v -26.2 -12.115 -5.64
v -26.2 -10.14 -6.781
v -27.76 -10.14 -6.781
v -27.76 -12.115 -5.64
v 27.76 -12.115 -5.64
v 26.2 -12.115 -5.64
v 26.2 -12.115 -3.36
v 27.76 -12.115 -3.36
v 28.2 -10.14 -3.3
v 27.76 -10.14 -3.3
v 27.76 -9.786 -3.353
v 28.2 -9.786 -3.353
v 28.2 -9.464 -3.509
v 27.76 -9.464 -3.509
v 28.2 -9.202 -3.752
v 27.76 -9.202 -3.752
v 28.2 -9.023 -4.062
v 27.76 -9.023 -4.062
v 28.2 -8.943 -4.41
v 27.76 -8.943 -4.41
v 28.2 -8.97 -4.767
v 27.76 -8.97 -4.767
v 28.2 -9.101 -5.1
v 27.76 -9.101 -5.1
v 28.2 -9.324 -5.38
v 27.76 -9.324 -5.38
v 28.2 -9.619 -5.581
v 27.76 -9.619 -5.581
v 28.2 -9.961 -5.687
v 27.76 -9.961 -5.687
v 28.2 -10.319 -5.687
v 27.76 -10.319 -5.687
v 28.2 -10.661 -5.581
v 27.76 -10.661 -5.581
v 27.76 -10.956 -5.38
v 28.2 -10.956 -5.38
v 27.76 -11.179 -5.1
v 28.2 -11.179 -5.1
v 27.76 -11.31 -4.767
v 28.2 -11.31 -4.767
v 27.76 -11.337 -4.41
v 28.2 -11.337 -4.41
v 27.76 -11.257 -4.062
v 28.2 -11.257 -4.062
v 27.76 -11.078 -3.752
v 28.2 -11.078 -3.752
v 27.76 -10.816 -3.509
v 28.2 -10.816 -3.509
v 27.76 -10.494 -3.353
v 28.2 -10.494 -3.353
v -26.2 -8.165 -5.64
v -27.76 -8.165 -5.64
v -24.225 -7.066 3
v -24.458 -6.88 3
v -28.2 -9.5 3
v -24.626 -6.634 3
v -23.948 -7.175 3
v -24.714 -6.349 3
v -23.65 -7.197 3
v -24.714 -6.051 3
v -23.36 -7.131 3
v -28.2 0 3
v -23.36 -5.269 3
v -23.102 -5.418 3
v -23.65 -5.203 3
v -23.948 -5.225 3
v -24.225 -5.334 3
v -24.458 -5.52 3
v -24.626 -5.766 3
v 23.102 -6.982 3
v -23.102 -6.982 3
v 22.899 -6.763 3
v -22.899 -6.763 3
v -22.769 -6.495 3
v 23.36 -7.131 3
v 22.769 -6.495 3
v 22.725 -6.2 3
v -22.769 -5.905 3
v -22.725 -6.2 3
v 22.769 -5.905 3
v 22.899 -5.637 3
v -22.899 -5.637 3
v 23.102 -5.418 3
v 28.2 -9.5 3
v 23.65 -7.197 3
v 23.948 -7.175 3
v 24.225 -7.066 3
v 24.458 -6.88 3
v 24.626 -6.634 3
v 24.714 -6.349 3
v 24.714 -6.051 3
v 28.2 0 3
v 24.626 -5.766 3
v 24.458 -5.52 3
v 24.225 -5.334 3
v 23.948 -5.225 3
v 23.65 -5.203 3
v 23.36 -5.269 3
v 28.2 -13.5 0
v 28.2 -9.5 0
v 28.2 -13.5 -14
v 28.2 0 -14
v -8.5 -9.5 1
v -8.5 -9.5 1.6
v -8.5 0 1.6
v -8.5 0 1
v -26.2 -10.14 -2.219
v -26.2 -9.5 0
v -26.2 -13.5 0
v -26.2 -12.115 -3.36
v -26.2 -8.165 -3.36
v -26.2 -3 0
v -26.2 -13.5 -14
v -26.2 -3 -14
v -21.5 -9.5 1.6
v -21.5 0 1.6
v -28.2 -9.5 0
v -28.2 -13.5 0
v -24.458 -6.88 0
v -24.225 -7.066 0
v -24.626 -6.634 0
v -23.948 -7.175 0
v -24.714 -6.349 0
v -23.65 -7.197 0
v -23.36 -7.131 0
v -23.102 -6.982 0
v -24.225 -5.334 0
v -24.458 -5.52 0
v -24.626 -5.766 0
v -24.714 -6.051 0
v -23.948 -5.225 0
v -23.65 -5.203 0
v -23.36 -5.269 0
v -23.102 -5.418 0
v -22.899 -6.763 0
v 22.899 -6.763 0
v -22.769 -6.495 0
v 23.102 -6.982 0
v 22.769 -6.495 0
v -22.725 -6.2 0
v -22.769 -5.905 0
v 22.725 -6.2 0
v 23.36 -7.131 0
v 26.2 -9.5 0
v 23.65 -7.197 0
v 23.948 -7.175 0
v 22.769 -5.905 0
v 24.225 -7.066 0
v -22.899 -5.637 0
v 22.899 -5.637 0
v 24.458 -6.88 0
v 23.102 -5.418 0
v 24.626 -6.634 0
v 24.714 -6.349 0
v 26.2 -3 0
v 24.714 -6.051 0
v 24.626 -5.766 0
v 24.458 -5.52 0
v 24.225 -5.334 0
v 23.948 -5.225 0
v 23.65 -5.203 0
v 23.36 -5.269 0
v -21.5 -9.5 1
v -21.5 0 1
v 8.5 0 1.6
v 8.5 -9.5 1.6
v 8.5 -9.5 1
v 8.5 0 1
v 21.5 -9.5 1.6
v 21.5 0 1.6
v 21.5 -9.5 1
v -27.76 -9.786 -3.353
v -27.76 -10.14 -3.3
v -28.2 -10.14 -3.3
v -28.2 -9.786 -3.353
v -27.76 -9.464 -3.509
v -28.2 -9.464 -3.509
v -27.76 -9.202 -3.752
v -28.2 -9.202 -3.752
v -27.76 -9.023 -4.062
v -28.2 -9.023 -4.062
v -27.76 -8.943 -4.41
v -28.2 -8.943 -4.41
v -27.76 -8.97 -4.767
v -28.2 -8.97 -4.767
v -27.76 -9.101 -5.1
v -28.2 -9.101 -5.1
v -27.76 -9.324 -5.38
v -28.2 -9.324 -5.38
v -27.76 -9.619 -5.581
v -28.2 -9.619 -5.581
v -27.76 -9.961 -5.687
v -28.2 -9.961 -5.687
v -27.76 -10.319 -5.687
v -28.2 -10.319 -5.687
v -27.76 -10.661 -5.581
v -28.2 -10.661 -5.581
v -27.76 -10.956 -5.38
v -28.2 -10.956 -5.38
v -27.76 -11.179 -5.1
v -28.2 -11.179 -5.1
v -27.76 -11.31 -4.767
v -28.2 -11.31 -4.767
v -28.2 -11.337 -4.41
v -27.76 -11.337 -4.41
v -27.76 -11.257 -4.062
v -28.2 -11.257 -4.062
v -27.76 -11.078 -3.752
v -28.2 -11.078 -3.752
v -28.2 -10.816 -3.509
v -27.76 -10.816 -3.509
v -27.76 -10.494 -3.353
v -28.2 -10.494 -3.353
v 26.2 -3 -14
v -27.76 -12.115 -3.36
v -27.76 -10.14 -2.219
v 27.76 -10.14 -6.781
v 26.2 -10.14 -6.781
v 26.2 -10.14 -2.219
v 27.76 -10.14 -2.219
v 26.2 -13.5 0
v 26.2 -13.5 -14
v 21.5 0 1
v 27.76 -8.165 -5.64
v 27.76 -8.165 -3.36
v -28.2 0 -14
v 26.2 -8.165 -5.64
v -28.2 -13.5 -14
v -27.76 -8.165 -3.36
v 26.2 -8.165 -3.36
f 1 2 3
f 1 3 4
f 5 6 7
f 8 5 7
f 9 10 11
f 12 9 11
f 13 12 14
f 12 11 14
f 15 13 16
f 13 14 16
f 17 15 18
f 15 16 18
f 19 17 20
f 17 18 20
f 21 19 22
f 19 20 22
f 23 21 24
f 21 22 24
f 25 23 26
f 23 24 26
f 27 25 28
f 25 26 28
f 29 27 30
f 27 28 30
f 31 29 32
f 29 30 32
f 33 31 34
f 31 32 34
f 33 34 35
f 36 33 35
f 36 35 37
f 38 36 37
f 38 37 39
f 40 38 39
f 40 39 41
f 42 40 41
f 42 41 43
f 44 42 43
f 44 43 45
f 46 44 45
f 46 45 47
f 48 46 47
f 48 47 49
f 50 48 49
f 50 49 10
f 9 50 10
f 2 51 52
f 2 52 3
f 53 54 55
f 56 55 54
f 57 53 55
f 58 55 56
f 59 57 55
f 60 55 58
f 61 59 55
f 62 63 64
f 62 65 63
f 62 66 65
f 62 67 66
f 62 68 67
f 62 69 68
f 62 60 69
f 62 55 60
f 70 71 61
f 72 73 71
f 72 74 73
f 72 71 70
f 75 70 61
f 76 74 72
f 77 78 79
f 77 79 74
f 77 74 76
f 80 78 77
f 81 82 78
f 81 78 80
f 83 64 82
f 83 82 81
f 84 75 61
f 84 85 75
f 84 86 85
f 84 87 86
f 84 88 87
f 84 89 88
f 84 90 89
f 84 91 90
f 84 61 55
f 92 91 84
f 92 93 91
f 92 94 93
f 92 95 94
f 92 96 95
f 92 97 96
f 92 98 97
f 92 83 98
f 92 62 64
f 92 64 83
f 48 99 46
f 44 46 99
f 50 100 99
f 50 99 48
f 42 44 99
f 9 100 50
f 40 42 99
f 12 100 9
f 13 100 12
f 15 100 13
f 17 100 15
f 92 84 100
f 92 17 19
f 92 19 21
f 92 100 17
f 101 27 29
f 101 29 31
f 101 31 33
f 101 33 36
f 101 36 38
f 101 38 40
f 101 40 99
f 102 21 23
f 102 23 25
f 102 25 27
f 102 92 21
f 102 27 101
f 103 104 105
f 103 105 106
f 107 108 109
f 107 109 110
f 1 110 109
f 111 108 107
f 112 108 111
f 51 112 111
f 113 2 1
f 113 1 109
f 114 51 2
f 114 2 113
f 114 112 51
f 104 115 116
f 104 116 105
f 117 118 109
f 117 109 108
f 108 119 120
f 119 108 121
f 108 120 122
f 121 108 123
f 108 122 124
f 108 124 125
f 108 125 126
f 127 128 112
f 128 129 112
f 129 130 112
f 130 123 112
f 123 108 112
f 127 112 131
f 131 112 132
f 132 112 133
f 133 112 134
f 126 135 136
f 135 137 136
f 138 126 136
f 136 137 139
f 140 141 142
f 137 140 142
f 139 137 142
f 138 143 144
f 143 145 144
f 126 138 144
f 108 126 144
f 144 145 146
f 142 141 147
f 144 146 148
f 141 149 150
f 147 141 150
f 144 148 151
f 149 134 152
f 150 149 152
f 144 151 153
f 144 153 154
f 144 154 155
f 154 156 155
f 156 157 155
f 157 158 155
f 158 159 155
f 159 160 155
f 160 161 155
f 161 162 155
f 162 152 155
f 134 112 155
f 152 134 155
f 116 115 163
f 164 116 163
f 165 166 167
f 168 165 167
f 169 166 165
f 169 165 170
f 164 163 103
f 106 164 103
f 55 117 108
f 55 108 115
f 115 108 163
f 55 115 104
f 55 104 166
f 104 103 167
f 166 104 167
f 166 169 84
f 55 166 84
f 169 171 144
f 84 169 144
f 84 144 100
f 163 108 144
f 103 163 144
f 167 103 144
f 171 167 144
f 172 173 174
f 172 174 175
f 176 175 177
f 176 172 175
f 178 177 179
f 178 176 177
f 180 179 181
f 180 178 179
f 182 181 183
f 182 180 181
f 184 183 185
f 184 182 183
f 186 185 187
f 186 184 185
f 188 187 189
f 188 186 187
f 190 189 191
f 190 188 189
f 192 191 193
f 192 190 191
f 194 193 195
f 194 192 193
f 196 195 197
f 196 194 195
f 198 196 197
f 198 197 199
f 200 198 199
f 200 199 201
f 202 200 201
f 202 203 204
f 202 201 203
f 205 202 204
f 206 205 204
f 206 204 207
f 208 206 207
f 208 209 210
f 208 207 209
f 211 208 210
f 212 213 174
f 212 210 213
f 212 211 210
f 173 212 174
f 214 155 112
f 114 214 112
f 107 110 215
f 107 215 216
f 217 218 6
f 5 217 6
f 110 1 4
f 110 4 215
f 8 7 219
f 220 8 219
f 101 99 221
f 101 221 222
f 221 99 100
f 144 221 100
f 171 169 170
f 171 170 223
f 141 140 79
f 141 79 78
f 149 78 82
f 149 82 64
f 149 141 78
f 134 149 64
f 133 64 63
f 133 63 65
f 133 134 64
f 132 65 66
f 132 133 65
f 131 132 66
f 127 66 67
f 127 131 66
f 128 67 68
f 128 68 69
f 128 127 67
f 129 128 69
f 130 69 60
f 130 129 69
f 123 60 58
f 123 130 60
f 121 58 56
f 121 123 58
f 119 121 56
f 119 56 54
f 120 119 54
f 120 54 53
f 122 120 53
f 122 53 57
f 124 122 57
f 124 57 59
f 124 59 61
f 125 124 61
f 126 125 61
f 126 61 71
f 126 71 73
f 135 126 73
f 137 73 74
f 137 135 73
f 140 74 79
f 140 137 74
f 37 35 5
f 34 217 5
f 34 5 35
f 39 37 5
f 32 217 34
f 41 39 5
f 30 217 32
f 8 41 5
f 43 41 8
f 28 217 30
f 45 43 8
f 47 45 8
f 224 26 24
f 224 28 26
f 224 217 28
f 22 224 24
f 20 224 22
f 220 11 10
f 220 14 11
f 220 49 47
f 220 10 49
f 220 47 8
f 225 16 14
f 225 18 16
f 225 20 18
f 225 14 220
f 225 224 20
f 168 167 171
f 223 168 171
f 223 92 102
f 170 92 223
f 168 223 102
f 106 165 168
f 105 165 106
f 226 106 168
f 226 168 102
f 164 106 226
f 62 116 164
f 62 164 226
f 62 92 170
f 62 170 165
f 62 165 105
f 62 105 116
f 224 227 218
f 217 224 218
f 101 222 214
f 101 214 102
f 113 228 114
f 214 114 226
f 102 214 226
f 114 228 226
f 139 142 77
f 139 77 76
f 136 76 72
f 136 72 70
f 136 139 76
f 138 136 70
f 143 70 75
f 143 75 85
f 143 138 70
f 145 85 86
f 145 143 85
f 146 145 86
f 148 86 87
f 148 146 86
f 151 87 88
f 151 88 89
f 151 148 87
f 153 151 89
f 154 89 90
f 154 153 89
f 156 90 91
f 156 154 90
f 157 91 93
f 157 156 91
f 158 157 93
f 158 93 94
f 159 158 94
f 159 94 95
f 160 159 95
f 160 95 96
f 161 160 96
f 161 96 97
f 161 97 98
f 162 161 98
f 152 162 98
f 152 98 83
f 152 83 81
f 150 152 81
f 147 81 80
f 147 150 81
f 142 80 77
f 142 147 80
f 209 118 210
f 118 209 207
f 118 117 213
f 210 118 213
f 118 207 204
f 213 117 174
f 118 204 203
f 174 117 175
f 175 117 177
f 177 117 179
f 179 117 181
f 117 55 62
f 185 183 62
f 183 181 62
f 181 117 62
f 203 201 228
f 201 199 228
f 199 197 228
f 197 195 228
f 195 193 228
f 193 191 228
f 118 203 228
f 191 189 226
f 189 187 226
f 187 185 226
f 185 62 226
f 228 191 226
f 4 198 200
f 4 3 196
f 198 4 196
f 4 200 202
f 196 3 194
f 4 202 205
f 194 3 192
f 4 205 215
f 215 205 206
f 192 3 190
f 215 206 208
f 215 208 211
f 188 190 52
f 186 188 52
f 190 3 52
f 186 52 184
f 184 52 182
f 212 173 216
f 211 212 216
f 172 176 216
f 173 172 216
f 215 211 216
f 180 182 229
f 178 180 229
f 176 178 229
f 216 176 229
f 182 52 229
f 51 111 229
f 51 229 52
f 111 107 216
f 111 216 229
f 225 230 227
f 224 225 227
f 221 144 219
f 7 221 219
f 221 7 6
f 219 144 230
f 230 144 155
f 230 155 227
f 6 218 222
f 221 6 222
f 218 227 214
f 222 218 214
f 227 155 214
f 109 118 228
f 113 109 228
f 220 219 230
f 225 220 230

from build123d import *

# Parameters (mm, degrees)
SCHIZZO1_W                   = 56.4
SCHIZZO1_H                   = 9.5
SCHIZZO1_R                   = 1
ESTRUSIONE_ESTRUSIONE1_DEPTH = 3
SCHIZZO2_W                   = 56.4
SCHIZZO2_H                   = 3
ESTRUSIONE_ESTRUSIONE2_DEPTH = 14
SCHIZZO3_W                   = 14
SCHIZZO3_H                   = 10.5
ESTRUSIONE_ESTRUSIONE3_DEPTH = 2
FORO_PER_VITE_M2_1_D         = 2.4
FORO_PER_VITE_M2_1_DEPTH     = 56.4
TAGLIO_ESTRUSIONE1_DEPTH     = 1.56
TAGLIO_ESTRUSIONE3_START     = -9.5
SCHIZZO8_W                   = 13
SCHIZZO8_H                   = 0.6
TAGLIO_ESTRUSIONE3_DEPTH     = 9.5


with BuildPart() as part:
    # Schizzo1 → Estrusione-Estrusione1 (new body)
    with BuildSketch(Plane.XY):
        with Locations((0, -4.75)):
            Rectangle(SCHIZZO1_W, SCHIZZO1_H)
        with Locations((-23.725, -6.2)):
            Circle(SCHIZZO1_R, mode=Mode.SUBTRACT)
        with Locations(Location((23.725, -6.2, 0), (0, 0, 180))):
            Circle(SCHIZZO1_R, mode=Mode.SUBTRACT)
    extrude(amount=ESTRUSIONE_ESTRUSIONE1_DEPTH)

    # Schizzo2 → Estrusione-Estrusione2 (add)
    with BuildSketch(Plane(origin=(0, 0, 0), x_dir=(-1, 0, 0), z_dir=(0, 0, -1))):
        with Locations((0, -1.5)):
            Rectangle(SCHIZZO2_W, SCHIZZO2_H)
    extrude(amount=ESTRUSIONE_ESTRUSIONE2_DEPTH)

    # Schizzo3 → Estrusione-Estrusione3 (add)
    with BuildSketch(Plane(origin=(28.2, 0, 0), x_dir=(0, 0, -1), z_dir=(1, 0, 0))):
        with Locations((7, -8.25)):
            Rectangle(SCHIZZO3_W, SCHIZZO3_H)
    estrusione_estrusione3 = extrude(amount=-ESTRUSIONE_ESTRUSIONE3_DEPTH)

    # Foro per Vite M2-1
    with Locations(Plane(origin=(28.2, 0, 0), x_dir=(0, 0, -1), z_dir=(1, 0, 0))):
        with Locations((4.5, -10.14)):
            foro_per_vite_m2_1 = Hole(FORO_PER_VITE_M2_1_D / 2, depth=FORO_PER_VITE_M2_1_DEPTH)

    # Schizzo6 → Taglio-Estrusione1 (cut)
    with BuildSketch(Plane.ZY.offset(-26.2)):
        Polygon((-5.640266782, -8.165), (-6.780533563, -10.14), (-5.640266782, -12.115), (-3.359733218, -12.115), (-2.219466437, -10.14), (-3.359733218, -8.165), align=None)
    taglio_estrusione1 = extrude(amount=-TAGLIO_ESTRUSIONE1_DEPTH, mode=Mode.SUBTRACT)

    # Specchia2: Estrusione-Estrusione3, Foro per Vite M2-1, Taglio-Estrusione1 across plane
    add(estrusione_estrusione3.mirror(Plane(origin=(0, 0, 0), x_dir=(0, 0, 1), z_dir=(1, 0, 0))))
    add(foro_per_vite_m2_1.mirror(Plane(origin=(0, 0, 0), x_dir=(0, 0, 1), z_dir=(1, 0, 0))), mode=Mode.SUBTRACT)
    add(taglio_estrusione1.mirror(Plane(origin=(0, 0, 0), x_dir=(0, 0, 1), z_dir=(1, 0, 0))), mode=Mode.SUBTRACT)

    # Schizzo8 → Taglio-Estrusione3 (cut)
    with BuildSketch(Plane(origin=(0, 0, -9), x_dir=(1, 0, 0), z_dir=(0, 1, 0)).offset(TAGLIO_ESTRUSIONE3_START)):
        with Locations((15, -10.3)):
            Rectangle(SCHIZZO8_W, SCHIZZO8_H)
        with Locations((-15, -10.3)):
            Rectangle(SCHIZZO8_W, SCHIZZO8_H)
    extrude(amount=TAGLIO_ESTRUSIONE3_DEPTH, mode=Mode.SUBTRACT)


solid = part.part
